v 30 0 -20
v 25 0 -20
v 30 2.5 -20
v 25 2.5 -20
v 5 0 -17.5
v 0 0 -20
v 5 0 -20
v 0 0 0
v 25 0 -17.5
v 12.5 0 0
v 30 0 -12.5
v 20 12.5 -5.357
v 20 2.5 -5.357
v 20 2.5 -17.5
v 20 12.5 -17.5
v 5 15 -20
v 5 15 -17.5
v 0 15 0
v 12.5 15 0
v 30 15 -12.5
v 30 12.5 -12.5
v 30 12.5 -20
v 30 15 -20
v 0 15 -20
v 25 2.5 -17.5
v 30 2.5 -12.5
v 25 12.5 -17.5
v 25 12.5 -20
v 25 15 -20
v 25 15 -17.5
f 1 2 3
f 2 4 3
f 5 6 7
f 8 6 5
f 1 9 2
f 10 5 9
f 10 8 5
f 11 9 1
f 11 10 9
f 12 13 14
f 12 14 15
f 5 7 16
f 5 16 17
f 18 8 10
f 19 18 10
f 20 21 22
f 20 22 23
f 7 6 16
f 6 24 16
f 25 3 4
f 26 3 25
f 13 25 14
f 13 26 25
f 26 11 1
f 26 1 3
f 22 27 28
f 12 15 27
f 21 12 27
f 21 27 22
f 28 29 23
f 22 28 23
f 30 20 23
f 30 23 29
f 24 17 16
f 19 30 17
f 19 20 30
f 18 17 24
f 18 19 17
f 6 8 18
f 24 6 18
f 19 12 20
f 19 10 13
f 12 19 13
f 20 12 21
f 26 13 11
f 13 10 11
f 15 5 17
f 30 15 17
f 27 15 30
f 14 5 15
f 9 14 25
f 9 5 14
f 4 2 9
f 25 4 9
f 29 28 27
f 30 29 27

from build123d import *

# Parameters (mm, degrees)
F0_W     = 12.5
F0_H     = 15
F1_DEPTH = 20
F2_DEPTH = 20
F4_DEPTH = 15.001
F3_W     = 20
F3_H     = 2.5
F5_DEPTH = 15.001


with BuildPart() as f1:
    # F0 (on Top) → F1 (new body)
    with BuildSketch(Plane.XY):
        with Locations((6.25, 7.5)):
            Rectangle(F0_W, F0_H)
    extrude(amount=-F1_DEPTH)

    # F0 (on Top) → F2 (join)
    with BuildSketch(Plane.XY):
        Polygon((12.5, 15), (12.5, 0), (20, 0), (30, 0), (30, 2.5), (20, 2.5), (20, 12.5), (30, 12.5), (30, 15), (20, 15), align=None)
    extrude(amount=-F2_DEPTH)

    # F3 (on face) → F4 (cut, through all)
    with BuildSketch(Plane.XZ):
        Polygon((30, 0), (12.5, 0), (30, -12.5), align=None)
    extrude(amount=-F4_DEPTH, mode=Mode.SUBTRACT)

    # F3 (on face) → F5 (cut, through all)
    with BuildSketch(Plane.XZ):
        with Locations((15, -18.75)):
            Rectangle(F3_W, F3_H)
    extrude(amount=-F5_DEPTH, mode=Mode.SUBTRACT)


solid = f1.part
